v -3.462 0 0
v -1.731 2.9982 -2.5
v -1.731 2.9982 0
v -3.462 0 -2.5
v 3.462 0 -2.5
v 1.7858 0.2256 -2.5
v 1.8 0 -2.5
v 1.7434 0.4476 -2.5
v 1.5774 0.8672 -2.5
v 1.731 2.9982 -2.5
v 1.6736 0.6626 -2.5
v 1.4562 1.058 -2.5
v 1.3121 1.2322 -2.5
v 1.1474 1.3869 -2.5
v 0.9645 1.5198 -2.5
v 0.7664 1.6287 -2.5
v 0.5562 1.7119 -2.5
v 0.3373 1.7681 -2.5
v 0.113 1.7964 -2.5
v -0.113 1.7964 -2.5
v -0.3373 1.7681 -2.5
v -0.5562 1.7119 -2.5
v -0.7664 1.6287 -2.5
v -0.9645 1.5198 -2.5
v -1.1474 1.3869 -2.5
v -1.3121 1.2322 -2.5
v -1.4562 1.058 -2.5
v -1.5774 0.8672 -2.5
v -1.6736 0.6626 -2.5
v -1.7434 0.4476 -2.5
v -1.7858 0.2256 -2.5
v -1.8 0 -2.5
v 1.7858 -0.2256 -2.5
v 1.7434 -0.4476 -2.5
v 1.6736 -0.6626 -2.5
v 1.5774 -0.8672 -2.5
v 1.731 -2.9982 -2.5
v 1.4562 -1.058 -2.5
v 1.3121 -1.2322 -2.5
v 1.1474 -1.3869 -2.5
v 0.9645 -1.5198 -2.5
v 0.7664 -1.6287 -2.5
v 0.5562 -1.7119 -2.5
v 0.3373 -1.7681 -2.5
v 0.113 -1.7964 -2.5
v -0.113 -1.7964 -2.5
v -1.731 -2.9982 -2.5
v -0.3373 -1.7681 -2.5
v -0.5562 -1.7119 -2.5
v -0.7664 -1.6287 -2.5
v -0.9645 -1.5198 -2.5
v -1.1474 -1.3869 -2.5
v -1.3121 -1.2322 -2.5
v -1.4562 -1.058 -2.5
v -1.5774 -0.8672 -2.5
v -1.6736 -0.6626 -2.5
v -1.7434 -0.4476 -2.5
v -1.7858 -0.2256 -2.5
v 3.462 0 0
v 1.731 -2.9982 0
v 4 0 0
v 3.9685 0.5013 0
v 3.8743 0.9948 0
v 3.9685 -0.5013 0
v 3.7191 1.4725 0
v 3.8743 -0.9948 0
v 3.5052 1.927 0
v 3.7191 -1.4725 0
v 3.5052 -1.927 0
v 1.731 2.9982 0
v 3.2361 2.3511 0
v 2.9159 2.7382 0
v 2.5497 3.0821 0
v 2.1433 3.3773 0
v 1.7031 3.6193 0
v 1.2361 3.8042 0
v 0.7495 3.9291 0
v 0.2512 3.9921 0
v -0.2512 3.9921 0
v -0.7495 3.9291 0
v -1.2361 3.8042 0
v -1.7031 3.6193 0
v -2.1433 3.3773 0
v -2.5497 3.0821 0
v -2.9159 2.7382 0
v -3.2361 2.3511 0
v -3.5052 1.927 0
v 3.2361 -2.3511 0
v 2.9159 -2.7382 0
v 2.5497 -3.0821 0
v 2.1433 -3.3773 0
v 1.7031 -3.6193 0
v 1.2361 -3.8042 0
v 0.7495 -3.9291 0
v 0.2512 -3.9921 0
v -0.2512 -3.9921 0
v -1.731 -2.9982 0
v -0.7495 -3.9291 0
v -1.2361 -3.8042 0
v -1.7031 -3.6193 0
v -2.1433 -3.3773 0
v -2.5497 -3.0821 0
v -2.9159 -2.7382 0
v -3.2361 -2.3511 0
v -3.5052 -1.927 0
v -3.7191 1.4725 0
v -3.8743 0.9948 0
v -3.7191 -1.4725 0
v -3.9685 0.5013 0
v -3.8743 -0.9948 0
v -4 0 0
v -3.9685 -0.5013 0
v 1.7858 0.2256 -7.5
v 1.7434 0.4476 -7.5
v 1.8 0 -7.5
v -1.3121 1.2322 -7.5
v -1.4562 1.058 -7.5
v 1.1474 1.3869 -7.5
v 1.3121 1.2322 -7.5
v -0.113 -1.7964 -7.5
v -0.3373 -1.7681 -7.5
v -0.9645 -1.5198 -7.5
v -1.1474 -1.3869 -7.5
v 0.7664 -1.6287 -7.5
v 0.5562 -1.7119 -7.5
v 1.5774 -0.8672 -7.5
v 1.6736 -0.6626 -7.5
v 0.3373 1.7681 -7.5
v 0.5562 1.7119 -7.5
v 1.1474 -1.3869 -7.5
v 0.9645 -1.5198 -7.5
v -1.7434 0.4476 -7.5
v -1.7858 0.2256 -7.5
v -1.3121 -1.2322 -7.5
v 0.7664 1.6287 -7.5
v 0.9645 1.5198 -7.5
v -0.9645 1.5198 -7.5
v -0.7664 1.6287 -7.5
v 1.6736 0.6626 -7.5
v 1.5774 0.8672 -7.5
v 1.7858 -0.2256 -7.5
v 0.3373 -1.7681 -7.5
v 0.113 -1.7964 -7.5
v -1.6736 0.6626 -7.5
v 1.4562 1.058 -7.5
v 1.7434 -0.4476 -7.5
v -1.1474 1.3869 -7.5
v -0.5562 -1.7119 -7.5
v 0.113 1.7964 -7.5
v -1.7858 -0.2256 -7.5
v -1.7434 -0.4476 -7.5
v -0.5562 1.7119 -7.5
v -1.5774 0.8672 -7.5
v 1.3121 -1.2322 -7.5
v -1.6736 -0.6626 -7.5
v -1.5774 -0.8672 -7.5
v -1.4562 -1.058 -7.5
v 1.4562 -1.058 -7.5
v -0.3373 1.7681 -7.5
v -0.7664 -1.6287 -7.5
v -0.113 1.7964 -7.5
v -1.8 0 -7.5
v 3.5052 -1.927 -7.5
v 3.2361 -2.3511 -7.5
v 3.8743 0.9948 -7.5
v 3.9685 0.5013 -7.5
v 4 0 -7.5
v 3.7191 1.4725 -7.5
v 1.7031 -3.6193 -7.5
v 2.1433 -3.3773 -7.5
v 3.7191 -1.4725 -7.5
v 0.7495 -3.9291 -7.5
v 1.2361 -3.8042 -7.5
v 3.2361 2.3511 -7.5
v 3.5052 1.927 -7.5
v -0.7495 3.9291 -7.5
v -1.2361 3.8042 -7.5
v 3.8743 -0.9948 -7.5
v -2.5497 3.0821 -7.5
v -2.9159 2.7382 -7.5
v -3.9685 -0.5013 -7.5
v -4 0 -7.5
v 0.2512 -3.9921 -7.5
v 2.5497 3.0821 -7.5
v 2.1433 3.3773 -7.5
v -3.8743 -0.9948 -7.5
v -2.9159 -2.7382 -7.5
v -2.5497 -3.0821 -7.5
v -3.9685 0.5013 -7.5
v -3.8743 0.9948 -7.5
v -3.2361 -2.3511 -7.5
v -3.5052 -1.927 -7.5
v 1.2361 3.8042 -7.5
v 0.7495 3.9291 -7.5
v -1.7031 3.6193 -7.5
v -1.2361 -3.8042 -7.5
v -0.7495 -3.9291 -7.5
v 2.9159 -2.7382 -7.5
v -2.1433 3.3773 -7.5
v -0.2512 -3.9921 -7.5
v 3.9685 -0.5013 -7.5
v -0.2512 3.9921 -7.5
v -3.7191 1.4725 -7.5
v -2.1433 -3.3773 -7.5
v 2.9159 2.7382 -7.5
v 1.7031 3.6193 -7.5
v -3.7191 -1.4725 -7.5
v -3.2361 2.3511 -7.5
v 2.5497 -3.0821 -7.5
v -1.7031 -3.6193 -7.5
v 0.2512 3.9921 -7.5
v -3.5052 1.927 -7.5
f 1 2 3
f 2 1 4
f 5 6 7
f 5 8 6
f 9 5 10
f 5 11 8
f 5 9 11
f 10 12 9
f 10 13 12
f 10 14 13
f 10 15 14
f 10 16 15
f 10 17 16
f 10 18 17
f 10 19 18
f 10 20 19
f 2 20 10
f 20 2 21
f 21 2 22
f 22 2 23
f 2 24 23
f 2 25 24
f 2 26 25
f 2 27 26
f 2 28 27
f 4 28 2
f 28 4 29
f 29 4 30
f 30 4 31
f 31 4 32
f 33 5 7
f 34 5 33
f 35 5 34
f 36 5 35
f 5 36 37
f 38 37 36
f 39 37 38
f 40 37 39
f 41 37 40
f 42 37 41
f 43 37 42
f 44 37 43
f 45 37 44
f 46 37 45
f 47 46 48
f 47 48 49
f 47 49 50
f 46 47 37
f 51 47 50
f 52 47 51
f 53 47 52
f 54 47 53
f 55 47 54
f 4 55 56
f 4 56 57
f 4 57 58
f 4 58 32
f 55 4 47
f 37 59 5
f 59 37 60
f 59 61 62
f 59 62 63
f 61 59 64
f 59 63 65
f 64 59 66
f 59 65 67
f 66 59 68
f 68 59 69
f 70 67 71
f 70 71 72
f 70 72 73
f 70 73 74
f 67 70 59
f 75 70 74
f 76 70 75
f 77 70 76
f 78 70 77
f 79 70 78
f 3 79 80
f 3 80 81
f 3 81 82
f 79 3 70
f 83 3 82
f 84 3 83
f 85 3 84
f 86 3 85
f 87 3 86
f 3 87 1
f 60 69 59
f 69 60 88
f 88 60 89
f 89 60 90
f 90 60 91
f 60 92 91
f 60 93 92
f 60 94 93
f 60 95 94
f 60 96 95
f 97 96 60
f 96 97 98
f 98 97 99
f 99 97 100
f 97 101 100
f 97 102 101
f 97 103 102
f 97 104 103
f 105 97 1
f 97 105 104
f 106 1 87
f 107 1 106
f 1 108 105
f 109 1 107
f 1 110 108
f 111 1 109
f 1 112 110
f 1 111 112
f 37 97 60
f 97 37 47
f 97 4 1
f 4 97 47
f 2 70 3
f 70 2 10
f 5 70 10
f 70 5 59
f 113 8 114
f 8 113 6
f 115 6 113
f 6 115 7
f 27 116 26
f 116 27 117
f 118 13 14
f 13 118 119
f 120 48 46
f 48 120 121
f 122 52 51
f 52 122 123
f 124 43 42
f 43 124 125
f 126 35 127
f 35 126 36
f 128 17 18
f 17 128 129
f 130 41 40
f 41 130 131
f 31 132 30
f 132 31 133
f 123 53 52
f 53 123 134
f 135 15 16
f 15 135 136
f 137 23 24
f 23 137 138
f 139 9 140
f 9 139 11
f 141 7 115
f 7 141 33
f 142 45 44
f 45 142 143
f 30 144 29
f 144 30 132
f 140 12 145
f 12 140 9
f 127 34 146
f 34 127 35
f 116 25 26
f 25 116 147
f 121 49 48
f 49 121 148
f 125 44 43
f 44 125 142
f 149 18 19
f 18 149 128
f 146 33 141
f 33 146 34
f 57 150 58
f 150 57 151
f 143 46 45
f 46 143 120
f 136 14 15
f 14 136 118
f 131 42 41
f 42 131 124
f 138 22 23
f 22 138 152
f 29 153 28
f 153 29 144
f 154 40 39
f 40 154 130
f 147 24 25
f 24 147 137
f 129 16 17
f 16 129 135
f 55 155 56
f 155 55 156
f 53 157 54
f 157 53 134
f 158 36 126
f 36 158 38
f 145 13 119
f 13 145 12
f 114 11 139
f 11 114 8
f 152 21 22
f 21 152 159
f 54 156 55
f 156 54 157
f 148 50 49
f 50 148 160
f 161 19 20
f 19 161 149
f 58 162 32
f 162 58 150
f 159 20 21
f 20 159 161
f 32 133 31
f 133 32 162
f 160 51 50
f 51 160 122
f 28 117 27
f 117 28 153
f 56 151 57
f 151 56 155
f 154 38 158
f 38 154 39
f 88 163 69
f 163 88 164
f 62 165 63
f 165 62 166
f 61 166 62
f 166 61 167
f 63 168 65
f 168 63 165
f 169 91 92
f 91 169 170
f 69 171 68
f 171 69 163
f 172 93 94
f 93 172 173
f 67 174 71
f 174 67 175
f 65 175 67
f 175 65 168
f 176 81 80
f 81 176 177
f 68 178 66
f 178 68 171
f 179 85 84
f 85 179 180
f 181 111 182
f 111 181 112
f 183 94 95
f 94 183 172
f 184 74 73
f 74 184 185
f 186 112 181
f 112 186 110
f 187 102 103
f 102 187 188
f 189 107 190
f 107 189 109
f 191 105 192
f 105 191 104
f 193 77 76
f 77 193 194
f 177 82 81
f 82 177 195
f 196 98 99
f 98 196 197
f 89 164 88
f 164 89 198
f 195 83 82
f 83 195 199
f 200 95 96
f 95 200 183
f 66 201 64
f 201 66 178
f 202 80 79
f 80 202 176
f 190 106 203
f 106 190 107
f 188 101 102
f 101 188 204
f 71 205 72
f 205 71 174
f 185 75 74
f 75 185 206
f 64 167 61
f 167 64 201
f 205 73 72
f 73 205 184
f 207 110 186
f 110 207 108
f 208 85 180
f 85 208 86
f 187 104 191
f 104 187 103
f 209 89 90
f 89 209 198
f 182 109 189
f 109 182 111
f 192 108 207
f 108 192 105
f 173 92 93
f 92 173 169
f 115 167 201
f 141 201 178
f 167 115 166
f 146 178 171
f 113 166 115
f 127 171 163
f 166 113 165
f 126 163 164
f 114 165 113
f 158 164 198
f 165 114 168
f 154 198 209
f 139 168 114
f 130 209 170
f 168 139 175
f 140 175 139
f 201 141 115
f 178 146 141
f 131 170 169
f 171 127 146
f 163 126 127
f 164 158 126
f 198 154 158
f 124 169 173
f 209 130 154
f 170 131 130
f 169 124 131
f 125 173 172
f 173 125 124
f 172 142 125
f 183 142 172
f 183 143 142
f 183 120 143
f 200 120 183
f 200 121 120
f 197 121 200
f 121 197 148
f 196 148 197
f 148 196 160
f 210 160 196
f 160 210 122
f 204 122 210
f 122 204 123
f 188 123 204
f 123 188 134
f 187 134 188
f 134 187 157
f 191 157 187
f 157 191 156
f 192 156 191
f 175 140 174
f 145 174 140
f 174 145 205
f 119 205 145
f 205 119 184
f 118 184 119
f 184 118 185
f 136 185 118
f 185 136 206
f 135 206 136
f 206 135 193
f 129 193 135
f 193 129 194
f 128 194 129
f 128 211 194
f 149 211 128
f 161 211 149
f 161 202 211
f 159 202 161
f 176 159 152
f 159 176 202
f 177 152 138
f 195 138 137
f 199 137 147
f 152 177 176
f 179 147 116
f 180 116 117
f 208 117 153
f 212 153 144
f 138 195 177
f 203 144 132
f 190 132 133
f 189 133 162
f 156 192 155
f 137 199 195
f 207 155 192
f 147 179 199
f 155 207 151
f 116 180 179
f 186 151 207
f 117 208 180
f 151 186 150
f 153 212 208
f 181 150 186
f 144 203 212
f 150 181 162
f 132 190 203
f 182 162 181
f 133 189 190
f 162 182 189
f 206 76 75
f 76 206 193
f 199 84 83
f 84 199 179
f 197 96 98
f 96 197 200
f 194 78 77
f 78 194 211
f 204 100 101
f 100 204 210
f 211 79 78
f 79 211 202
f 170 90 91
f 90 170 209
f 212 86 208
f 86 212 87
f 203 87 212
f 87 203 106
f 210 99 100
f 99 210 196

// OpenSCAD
$fn = 50;

difference() {
	union() {
		translate(v = [0, 0, -7.5]) {
			cylinder(h = 10.5, r = 4.0);
		}
	}
	union() {
		translate(v = [0, 0, 0]) {
			rotate(a = [0, 0, 0]) {
				difference() {
					union() {
						translate(v = [0, 0, -2.5]) {
							linear_extrude(height = 2.5) {
								polygon(points = [[3.4619999999999997, 0.0], [1.7310000000000003, 2.9981799479017264], [-1.7309999999999992, 2.9981799479017264], [-3.4619999999999997, 4.2397272186481365e-16], [-1.7310000000000014, -2.998179947901726], [1.7309999999999977, -2.9981799479017277]]);
							}
						}
					}
					union();
				}
			}
		}
		#cylinder(h = 3, r = 5.0);
		#translate(v = [0, 0, -100.0]) {
			cylinder(h = 200, r = 1.8);
		}
	}
}
